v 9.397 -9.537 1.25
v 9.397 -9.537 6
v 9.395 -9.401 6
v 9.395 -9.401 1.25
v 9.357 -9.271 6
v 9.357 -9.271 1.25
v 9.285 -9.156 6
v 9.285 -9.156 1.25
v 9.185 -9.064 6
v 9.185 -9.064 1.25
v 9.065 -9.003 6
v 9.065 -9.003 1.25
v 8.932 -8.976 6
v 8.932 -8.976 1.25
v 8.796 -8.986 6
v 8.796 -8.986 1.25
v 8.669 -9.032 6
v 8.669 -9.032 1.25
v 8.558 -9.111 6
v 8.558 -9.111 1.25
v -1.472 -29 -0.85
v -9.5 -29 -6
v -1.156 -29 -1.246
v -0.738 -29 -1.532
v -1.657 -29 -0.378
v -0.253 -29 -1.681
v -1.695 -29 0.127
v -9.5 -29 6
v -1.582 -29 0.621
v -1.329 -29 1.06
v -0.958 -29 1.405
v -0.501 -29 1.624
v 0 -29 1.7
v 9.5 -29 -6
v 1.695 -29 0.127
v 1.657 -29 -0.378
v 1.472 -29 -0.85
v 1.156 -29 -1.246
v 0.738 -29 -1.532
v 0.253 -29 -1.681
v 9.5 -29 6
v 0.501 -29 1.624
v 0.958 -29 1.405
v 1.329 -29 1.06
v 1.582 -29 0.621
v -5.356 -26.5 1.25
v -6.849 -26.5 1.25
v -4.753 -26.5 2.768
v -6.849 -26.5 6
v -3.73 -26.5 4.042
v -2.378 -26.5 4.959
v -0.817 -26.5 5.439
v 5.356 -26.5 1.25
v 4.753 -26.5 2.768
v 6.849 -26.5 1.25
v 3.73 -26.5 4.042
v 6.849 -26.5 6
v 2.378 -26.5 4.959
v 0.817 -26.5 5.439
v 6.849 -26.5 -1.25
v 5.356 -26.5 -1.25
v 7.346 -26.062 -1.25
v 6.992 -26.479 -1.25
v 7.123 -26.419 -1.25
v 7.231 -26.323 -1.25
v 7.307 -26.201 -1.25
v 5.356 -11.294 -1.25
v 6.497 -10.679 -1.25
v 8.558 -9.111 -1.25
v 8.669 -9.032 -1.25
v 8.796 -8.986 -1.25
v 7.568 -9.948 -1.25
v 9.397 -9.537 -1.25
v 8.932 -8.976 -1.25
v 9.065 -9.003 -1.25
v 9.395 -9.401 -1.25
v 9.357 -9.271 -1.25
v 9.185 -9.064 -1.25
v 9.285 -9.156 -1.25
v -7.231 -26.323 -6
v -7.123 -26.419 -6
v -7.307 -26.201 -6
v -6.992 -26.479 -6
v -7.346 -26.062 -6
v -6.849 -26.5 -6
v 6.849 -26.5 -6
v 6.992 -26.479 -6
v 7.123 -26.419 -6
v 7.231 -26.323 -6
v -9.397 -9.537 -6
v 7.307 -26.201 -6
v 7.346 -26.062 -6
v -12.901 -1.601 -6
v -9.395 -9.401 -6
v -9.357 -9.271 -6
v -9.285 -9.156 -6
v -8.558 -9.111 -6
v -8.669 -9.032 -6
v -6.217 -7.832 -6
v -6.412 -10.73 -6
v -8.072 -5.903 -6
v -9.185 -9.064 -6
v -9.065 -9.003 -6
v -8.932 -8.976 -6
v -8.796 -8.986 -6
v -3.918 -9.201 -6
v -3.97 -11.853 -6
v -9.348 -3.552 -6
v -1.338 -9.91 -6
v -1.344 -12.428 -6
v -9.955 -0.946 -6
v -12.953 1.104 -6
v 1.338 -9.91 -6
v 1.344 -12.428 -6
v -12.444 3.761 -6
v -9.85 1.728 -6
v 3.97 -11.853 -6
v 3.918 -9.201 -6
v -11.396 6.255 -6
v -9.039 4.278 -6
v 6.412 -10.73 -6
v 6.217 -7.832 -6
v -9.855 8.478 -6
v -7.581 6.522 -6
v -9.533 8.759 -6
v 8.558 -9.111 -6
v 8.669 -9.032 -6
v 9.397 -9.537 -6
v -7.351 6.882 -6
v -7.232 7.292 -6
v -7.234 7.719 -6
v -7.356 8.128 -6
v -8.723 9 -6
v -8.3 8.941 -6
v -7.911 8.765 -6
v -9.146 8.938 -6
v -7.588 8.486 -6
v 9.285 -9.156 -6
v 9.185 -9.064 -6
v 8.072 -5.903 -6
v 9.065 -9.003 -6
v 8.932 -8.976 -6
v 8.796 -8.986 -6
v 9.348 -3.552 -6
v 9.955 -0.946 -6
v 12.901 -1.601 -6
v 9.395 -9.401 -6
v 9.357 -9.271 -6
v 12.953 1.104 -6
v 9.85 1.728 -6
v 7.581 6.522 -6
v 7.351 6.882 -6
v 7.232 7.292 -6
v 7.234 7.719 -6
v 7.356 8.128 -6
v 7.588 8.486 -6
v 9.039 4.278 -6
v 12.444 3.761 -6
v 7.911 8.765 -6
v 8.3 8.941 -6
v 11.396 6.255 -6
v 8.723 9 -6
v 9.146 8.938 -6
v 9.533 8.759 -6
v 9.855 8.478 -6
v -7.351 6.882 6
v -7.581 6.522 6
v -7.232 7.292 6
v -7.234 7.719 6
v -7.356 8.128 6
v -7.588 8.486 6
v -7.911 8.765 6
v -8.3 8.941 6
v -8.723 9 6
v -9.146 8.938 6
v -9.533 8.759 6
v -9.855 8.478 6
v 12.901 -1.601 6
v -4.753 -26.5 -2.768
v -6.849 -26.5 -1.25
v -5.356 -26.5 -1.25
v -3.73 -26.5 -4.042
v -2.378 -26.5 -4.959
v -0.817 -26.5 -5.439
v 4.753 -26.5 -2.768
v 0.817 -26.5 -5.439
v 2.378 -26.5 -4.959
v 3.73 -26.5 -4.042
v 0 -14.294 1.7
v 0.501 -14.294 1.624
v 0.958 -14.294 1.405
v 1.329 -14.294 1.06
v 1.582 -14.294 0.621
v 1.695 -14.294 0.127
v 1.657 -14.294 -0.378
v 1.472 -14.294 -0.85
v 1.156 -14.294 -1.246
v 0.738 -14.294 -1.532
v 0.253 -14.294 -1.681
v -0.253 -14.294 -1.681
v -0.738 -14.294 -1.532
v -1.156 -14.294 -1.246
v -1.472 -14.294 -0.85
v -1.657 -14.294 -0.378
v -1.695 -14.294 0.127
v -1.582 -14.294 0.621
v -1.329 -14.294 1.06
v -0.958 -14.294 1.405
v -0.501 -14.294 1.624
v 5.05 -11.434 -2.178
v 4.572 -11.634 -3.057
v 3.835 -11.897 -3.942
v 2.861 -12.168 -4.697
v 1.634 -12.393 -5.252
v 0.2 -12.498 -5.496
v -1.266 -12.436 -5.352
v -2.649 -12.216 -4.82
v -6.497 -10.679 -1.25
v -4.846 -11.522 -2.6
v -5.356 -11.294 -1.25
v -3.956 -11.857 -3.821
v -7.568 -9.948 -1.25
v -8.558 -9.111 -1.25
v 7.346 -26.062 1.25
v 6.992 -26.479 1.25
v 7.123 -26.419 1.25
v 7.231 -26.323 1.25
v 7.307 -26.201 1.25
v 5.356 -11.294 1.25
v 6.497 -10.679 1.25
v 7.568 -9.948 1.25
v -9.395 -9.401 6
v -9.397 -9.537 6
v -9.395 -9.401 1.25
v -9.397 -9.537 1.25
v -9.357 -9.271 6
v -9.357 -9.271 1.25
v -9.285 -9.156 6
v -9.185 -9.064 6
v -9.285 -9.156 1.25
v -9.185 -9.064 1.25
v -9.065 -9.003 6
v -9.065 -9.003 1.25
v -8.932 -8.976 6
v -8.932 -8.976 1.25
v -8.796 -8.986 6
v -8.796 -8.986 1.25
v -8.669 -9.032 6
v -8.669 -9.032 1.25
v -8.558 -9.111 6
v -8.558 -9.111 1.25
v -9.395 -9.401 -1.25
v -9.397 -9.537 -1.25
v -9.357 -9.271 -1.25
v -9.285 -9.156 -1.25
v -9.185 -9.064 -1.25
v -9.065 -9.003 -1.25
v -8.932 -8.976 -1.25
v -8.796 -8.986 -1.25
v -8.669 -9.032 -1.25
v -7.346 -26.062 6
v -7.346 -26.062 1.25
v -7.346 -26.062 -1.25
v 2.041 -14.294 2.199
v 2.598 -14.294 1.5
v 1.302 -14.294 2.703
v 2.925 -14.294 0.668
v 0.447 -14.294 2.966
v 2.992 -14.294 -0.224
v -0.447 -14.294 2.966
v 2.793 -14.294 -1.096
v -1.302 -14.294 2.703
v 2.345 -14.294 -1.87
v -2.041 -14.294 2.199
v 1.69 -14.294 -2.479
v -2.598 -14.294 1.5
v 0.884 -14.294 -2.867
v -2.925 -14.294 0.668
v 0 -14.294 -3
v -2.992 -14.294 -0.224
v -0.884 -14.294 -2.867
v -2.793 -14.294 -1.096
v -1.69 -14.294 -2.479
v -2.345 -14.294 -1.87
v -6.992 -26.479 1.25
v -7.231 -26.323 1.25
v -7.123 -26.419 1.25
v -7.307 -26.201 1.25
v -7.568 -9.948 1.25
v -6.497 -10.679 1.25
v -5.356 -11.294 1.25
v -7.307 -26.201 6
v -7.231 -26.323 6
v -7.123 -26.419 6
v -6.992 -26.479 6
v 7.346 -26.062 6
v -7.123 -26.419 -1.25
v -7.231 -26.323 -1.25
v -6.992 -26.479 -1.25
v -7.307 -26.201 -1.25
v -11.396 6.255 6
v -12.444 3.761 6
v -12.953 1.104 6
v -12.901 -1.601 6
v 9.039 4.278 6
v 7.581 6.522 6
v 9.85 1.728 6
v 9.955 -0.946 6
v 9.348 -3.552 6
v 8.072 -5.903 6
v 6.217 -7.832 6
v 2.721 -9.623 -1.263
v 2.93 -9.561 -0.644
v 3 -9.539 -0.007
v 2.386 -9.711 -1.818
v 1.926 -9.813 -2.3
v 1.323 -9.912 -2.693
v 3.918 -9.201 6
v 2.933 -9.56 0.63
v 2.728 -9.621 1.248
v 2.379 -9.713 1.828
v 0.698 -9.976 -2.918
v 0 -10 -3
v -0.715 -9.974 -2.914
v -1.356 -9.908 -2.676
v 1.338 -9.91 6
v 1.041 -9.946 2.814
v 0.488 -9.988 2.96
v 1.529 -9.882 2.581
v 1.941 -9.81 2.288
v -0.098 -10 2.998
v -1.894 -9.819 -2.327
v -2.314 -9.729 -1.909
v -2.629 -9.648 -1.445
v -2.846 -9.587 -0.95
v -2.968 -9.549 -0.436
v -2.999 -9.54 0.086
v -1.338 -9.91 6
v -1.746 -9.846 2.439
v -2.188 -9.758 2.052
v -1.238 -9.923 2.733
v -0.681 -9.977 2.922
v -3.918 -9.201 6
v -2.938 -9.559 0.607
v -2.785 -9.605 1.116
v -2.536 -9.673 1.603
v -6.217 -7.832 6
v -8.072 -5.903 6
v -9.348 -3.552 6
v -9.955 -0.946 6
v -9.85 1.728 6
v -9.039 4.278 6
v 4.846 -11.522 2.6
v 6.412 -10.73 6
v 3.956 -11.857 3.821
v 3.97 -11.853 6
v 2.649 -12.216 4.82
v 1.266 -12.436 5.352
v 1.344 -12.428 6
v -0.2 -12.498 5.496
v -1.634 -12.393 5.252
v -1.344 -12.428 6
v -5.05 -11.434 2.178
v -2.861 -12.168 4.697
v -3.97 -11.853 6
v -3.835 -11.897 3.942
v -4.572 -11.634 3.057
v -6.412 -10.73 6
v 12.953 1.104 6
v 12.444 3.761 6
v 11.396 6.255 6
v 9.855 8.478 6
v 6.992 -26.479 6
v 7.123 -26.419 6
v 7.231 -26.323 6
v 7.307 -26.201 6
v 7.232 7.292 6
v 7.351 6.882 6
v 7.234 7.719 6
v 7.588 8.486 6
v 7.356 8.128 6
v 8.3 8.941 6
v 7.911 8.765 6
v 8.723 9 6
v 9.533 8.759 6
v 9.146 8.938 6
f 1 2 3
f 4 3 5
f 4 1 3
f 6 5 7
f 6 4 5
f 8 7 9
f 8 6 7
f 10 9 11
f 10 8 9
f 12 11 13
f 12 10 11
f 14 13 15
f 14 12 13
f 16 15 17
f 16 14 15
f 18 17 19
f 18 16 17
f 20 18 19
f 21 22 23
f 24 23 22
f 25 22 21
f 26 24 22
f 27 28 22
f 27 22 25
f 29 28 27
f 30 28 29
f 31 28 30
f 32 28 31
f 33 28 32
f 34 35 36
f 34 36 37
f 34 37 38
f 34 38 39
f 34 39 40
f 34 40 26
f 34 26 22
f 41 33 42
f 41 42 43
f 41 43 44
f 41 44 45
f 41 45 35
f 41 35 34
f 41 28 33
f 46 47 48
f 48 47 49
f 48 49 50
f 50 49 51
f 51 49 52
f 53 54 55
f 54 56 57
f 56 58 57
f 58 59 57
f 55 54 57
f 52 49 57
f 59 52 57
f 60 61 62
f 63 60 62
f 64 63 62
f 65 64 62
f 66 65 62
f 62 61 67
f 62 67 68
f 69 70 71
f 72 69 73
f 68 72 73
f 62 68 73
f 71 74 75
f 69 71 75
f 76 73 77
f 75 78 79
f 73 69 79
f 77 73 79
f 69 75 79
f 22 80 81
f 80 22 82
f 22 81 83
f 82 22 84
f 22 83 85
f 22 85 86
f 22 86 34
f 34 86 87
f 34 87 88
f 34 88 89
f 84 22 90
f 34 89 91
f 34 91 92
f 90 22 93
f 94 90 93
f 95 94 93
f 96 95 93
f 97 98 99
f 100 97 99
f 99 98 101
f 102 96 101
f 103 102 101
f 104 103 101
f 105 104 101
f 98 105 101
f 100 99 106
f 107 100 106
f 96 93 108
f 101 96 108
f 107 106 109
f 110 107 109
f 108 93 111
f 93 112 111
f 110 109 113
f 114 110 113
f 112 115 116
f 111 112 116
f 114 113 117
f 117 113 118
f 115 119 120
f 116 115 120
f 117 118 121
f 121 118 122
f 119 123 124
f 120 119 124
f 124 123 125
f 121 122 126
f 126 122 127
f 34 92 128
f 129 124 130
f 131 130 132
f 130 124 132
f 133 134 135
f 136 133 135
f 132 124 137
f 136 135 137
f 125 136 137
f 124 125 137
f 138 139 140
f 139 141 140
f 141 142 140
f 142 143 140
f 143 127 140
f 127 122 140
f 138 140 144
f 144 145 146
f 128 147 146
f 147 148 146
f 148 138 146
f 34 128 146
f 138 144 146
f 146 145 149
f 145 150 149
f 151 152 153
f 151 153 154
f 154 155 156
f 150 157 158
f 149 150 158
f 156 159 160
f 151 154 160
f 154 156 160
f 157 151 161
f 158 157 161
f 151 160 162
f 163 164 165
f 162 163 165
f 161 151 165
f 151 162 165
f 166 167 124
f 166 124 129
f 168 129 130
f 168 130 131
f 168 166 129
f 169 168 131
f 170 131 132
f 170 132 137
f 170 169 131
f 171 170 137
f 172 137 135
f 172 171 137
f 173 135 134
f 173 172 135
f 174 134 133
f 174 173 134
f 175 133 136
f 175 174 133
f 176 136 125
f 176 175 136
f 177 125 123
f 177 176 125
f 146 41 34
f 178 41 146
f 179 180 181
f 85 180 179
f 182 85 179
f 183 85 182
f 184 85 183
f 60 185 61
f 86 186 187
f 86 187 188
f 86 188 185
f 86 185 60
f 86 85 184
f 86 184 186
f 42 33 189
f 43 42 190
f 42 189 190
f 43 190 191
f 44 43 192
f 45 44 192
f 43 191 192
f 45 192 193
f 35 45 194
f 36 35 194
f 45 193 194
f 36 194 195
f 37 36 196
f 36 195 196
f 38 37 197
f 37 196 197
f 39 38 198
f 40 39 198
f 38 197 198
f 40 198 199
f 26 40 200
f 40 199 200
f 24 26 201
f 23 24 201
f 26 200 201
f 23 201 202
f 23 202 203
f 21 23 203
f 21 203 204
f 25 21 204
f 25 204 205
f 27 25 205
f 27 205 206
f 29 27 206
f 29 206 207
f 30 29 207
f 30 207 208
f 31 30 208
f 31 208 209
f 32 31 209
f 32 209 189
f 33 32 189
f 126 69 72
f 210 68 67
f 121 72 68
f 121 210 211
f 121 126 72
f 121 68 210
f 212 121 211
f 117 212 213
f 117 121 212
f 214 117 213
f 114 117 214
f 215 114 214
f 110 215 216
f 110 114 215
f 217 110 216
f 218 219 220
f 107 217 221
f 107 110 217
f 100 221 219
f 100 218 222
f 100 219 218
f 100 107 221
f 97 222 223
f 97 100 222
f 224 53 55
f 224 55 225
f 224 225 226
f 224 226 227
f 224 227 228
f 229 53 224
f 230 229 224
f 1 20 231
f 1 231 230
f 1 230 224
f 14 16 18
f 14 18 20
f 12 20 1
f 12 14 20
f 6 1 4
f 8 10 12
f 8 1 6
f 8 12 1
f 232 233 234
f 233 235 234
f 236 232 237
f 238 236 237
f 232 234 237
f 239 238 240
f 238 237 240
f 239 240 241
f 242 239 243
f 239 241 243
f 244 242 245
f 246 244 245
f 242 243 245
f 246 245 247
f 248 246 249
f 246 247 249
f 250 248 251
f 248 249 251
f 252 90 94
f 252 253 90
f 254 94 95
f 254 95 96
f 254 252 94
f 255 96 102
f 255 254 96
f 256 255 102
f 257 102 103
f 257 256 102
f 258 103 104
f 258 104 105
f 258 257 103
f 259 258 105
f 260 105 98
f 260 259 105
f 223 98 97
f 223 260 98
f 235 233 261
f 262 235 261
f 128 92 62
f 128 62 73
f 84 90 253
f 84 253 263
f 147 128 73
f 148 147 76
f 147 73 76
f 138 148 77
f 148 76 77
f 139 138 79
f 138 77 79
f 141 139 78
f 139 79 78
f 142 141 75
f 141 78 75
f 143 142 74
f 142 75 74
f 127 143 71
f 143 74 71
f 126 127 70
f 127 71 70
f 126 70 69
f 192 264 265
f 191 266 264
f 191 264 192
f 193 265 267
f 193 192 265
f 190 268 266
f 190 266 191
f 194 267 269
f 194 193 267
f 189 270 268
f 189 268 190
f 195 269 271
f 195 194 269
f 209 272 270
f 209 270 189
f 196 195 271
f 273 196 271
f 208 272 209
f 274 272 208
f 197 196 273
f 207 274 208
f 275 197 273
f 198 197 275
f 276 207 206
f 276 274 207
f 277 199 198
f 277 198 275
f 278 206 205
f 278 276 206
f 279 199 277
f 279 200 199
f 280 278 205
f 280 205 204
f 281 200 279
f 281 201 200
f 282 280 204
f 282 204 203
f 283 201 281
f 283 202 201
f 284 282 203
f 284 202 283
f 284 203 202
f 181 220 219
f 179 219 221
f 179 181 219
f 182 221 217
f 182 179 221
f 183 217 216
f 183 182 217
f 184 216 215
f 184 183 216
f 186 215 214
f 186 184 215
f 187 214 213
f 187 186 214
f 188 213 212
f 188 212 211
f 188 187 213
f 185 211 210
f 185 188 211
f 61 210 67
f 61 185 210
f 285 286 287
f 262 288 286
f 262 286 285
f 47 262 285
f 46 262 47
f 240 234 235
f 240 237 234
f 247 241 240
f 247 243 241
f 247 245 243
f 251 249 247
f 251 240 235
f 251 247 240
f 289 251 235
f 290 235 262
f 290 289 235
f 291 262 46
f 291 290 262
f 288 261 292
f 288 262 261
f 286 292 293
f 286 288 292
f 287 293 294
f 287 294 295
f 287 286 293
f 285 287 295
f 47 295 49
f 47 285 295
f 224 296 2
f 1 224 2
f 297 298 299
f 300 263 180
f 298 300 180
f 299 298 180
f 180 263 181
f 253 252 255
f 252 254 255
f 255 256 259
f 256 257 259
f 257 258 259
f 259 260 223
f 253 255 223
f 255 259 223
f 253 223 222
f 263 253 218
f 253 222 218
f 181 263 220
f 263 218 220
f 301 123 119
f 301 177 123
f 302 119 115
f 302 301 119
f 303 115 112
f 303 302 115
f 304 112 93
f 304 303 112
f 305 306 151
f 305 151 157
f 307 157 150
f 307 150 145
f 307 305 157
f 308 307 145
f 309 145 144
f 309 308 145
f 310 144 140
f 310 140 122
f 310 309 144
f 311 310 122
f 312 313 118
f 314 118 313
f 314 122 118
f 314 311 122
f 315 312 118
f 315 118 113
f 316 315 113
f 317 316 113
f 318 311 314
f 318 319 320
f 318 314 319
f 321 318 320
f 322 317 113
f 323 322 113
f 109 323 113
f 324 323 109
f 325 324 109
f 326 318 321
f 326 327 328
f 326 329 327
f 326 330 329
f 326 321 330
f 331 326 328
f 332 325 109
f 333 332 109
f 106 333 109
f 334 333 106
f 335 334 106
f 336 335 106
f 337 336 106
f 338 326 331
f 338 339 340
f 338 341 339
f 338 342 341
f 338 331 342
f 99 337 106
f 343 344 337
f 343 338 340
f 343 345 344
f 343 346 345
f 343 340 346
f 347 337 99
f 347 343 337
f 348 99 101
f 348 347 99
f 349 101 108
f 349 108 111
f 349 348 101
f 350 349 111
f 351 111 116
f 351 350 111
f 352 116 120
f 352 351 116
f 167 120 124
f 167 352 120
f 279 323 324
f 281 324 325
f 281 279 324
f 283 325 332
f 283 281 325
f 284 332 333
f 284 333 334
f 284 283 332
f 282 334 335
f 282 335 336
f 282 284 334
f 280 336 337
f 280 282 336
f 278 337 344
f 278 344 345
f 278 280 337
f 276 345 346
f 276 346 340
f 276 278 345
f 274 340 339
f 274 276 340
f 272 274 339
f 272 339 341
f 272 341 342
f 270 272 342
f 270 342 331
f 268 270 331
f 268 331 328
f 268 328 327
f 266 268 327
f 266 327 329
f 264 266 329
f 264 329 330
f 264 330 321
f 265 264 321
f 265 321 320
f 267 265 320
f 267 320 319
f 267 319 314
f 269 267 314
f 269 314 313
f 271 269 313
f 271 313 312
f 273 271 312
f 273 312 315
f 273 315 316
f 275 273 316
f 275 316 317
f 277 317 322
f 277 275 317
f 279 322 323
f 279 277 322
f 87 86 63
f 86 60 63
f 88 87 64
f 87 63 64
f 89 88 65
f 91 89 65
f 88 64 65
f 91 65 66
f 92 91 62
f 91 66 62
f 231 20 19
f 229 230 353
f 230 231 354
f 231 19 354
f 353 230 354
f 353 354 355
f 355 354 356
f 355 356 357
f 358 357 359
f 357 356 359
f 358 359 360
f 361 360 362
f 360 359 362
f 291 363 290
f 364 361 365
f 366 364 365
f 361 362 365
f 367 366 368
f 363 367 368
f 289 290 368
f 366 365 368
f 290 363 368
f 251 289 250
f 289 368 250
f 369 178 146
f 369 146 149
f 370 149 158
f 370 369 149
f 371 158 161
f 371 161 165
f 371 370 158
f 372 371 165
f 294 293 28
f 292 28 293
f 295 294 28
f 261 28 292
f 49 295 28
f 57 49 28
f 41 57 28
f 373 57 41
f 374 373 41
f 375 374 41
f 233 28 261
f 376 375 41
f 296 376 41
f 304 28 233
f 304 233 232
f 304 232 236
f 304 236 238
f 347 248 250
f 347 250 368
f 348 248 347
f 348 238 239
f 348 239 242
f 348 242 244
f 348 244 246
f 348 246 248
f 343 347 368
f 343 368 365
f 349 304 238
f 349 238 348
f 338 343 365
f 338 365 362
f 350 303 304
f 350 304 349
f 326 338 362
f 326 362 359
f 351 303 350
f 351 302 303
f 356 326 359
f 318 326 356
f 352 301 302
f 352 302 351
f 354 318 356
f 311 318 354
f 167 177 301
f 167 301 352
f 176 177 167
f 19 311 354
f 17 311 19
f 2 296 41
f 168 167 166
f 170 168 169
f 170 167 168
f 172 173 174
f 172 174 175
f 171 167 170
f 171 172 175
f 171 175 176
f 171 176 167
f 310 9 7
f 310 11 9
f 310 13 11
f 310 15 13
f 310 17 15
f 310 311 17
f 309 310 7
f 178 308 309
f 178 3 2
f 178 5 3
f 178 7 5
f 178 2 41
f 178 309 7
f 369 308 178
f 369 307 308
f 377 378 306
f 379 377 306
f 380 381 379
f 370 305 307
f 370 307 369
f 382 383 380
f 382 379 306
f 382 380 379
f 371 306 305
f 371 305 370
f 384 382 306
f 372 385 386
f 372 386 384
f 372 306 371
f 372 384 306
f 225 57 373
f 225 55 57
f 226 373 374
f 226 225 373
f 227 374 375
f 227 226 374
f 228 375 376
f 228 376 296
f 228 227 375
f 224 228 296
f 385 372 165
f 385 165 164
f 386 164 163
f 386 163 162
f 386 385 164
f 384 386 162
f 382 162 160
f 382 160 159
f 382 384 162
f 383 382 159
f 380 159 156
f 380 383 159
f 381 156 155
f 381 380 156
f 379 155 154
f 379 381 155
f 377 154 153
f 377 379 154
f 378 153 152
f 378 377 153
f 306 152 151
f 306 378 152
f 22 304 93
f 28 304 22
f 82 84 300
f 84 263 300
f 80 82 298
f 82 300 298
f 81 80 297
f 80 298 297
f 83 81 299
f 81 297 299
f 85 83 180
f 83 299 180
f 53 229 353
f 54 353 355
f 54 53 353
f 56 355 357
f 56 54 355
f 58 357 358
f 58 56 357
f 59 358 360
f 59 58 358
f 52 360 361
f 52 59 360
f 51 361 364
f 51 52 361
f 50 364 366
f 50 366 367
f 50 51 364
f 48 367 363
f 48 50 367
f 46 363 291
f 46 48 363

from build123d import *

# Parameters (mm, degrees)
BOSS_EXTRUDE1_DEPTH      = 6
CUT_EXTRUDE1_DEPTH       = 4.75
BOSS_EXTRUDE2_REACH      = 42.608
BOSS_EXTRUDE2_END_RADIUS = 12.5
SKETCH5_R                = 5.5
FILLET1_R                = 0.5
CUT_EXTRUDE2_DEPTH       = 5
CUT_EXTRUDE2_DEPTH_BACK  = 3
SKETCH6_R                = 3
SKETCH7_R                = 1.7
CUT_EXTRUDE3_DEPTH       = 28.342769961


with BuildPart() as part:
    # Sketch1 → Boss-Extrude1 (new, symmetric)
    with BuildSketch(Plane.XY):
        with BuildLine():
            Line((-9.5, -29), (9.5, -29))
            Line((9.5, -29), (12.900989015, -1.60140015))
            ThreePointArc((12.900989015, -1.60140015), (12.444176754, 3.760646876), (9.854901959, 8.47826087))
            ThreePointArc((9.854901959, 8.47826087), (7.739537018, 8.637104072), (7.580693815, 6.52173913))
            ThreePointArc((7.580693815, 6.52173913), (0, -10), (-7.580693815, 6.52173913))
            ThreePointArc((-7.580693815, 6.52173913), (-7.739537018, 8.637104072), (-9.854901959, 8.47826087))
            ThreePointArc((-9.854901959, 8.47826087), (-12.444176754, 3.760646876), (-12.900989015, -1.60140015))
            Line((-12.900989015, -1.60140015), (-9.5, -29))
        make_face()
    extrude(amount=BOSS_EXTRUDE1_DEPTH, both=True)

    # Sketch2 → Cut-Extrude1 (cut)
    with BuildSketch(Plane.XY.offset(6)):
        with BuildLine():
            Line((-9.5845508, -8.024112783), (-7.29113837, -26.5))
            Line((-7.29113837, -26.5), (7.29113837, -26.5))
            Line((7.29113837, -26.5), (9.5845508, -8.024112783))
            ThreePointArc((9.5845508, -8.024112783), (0, -12.5), (-9.5845508, -8.024112783))
        make_face()
    cut_extrude1 = extrude(amount=-CUT_EXTRUDE1_DEPTH, mode=Mode.SUBTRACT)

    # Mirror1: Cut-Extrude1 across plane
    add(cut_extrude1.mirror(Plane.XY), mode=Mode.SUBTRACT)

    # Boss-Extrude2: up to this cylinder (the profile starts outside it)
    boss_extrude2_end = Plane(origin=(0, 0, 0), z_dir=(0, 0, 1)) * Cylinder(BOSS_EXTRUDE2_END_RADIUS, 111.216, mode=Mode.PRIVATE)
    # Sketch5 → Boss-Extrude2 (add, up to the surface)
    with BuildSketch(Plane.XZ.offset(29), mode=Mode.PRIVATE) as boss_extrude2_sk1:
        Circle(SKETCH5_R)
    boss_extrude2_tool1 = extrude(boss_extrude2_sk1.sketch, amount=-BOSS_EXTRUDE2_REACH, mode=Mode.PRIVATE) - boss_extrude2_end
    add(boss_extrude2_tool1.solids().sort_by_distance((0, -29, 0))[0])

    # Fillet1
    fillet1_edges = [part.edges().sort_by_distance(p)[0] for p in [
        (-9.5845508, -8.024112783, 3.625),
        (9.5845508, -8.024112783, 3.625),
        (7.29113837, -26.5, 3.625),
        (-7.29113837, -26.5, 3.625),
        (9.5845508, -8.024112783, -3.625),
        (-9.5845508, -8.024112783, -3.625),
        (-7.29113837, -26.5, -3.625),
        (7.29113837, -26.5, -3.625),
    ]]
    fillet(fillet1_edges, radius=FILLET1_R)

    # Sketch6 → Cut-Extrude2 (cut, two sides: drawn at the far end of the back side and taken through both)
    with BuildSketch(Plane(origin=(0, -11.294356998, 0), x_dir=(1, 0, 0), z_dir=(0, 1, 0)).offset(-CUT_EXTRUDE2_DEPTH_BACK)):
        with Locations(Location((0, 0, 0), (0, 0, 90))):
            Circle(SKETCH6_R)
    extrude(amount=CUT_EXTRUDE2_DEPTH + CUT_EXTRUDE2_DEPTH_BACK, mode=Mode.SUBTRACT)

    # Sketch7 → Cut-Extrude3 (cut, through all)
    with BuildSketch(Plane(origin=(0, -14.294356998, 0), x_dir=(1, 0, 0), z_dir=(0, 1, 0))):
        with Locations(Location((0, 0, 0), (0, 0, 270))):
            Circle(SKETCH7_R)
    extrude(amount=-CUT_EXTRUDE3_DEPTH, mode=Mode.SUBTRACT)


solid = part.part
